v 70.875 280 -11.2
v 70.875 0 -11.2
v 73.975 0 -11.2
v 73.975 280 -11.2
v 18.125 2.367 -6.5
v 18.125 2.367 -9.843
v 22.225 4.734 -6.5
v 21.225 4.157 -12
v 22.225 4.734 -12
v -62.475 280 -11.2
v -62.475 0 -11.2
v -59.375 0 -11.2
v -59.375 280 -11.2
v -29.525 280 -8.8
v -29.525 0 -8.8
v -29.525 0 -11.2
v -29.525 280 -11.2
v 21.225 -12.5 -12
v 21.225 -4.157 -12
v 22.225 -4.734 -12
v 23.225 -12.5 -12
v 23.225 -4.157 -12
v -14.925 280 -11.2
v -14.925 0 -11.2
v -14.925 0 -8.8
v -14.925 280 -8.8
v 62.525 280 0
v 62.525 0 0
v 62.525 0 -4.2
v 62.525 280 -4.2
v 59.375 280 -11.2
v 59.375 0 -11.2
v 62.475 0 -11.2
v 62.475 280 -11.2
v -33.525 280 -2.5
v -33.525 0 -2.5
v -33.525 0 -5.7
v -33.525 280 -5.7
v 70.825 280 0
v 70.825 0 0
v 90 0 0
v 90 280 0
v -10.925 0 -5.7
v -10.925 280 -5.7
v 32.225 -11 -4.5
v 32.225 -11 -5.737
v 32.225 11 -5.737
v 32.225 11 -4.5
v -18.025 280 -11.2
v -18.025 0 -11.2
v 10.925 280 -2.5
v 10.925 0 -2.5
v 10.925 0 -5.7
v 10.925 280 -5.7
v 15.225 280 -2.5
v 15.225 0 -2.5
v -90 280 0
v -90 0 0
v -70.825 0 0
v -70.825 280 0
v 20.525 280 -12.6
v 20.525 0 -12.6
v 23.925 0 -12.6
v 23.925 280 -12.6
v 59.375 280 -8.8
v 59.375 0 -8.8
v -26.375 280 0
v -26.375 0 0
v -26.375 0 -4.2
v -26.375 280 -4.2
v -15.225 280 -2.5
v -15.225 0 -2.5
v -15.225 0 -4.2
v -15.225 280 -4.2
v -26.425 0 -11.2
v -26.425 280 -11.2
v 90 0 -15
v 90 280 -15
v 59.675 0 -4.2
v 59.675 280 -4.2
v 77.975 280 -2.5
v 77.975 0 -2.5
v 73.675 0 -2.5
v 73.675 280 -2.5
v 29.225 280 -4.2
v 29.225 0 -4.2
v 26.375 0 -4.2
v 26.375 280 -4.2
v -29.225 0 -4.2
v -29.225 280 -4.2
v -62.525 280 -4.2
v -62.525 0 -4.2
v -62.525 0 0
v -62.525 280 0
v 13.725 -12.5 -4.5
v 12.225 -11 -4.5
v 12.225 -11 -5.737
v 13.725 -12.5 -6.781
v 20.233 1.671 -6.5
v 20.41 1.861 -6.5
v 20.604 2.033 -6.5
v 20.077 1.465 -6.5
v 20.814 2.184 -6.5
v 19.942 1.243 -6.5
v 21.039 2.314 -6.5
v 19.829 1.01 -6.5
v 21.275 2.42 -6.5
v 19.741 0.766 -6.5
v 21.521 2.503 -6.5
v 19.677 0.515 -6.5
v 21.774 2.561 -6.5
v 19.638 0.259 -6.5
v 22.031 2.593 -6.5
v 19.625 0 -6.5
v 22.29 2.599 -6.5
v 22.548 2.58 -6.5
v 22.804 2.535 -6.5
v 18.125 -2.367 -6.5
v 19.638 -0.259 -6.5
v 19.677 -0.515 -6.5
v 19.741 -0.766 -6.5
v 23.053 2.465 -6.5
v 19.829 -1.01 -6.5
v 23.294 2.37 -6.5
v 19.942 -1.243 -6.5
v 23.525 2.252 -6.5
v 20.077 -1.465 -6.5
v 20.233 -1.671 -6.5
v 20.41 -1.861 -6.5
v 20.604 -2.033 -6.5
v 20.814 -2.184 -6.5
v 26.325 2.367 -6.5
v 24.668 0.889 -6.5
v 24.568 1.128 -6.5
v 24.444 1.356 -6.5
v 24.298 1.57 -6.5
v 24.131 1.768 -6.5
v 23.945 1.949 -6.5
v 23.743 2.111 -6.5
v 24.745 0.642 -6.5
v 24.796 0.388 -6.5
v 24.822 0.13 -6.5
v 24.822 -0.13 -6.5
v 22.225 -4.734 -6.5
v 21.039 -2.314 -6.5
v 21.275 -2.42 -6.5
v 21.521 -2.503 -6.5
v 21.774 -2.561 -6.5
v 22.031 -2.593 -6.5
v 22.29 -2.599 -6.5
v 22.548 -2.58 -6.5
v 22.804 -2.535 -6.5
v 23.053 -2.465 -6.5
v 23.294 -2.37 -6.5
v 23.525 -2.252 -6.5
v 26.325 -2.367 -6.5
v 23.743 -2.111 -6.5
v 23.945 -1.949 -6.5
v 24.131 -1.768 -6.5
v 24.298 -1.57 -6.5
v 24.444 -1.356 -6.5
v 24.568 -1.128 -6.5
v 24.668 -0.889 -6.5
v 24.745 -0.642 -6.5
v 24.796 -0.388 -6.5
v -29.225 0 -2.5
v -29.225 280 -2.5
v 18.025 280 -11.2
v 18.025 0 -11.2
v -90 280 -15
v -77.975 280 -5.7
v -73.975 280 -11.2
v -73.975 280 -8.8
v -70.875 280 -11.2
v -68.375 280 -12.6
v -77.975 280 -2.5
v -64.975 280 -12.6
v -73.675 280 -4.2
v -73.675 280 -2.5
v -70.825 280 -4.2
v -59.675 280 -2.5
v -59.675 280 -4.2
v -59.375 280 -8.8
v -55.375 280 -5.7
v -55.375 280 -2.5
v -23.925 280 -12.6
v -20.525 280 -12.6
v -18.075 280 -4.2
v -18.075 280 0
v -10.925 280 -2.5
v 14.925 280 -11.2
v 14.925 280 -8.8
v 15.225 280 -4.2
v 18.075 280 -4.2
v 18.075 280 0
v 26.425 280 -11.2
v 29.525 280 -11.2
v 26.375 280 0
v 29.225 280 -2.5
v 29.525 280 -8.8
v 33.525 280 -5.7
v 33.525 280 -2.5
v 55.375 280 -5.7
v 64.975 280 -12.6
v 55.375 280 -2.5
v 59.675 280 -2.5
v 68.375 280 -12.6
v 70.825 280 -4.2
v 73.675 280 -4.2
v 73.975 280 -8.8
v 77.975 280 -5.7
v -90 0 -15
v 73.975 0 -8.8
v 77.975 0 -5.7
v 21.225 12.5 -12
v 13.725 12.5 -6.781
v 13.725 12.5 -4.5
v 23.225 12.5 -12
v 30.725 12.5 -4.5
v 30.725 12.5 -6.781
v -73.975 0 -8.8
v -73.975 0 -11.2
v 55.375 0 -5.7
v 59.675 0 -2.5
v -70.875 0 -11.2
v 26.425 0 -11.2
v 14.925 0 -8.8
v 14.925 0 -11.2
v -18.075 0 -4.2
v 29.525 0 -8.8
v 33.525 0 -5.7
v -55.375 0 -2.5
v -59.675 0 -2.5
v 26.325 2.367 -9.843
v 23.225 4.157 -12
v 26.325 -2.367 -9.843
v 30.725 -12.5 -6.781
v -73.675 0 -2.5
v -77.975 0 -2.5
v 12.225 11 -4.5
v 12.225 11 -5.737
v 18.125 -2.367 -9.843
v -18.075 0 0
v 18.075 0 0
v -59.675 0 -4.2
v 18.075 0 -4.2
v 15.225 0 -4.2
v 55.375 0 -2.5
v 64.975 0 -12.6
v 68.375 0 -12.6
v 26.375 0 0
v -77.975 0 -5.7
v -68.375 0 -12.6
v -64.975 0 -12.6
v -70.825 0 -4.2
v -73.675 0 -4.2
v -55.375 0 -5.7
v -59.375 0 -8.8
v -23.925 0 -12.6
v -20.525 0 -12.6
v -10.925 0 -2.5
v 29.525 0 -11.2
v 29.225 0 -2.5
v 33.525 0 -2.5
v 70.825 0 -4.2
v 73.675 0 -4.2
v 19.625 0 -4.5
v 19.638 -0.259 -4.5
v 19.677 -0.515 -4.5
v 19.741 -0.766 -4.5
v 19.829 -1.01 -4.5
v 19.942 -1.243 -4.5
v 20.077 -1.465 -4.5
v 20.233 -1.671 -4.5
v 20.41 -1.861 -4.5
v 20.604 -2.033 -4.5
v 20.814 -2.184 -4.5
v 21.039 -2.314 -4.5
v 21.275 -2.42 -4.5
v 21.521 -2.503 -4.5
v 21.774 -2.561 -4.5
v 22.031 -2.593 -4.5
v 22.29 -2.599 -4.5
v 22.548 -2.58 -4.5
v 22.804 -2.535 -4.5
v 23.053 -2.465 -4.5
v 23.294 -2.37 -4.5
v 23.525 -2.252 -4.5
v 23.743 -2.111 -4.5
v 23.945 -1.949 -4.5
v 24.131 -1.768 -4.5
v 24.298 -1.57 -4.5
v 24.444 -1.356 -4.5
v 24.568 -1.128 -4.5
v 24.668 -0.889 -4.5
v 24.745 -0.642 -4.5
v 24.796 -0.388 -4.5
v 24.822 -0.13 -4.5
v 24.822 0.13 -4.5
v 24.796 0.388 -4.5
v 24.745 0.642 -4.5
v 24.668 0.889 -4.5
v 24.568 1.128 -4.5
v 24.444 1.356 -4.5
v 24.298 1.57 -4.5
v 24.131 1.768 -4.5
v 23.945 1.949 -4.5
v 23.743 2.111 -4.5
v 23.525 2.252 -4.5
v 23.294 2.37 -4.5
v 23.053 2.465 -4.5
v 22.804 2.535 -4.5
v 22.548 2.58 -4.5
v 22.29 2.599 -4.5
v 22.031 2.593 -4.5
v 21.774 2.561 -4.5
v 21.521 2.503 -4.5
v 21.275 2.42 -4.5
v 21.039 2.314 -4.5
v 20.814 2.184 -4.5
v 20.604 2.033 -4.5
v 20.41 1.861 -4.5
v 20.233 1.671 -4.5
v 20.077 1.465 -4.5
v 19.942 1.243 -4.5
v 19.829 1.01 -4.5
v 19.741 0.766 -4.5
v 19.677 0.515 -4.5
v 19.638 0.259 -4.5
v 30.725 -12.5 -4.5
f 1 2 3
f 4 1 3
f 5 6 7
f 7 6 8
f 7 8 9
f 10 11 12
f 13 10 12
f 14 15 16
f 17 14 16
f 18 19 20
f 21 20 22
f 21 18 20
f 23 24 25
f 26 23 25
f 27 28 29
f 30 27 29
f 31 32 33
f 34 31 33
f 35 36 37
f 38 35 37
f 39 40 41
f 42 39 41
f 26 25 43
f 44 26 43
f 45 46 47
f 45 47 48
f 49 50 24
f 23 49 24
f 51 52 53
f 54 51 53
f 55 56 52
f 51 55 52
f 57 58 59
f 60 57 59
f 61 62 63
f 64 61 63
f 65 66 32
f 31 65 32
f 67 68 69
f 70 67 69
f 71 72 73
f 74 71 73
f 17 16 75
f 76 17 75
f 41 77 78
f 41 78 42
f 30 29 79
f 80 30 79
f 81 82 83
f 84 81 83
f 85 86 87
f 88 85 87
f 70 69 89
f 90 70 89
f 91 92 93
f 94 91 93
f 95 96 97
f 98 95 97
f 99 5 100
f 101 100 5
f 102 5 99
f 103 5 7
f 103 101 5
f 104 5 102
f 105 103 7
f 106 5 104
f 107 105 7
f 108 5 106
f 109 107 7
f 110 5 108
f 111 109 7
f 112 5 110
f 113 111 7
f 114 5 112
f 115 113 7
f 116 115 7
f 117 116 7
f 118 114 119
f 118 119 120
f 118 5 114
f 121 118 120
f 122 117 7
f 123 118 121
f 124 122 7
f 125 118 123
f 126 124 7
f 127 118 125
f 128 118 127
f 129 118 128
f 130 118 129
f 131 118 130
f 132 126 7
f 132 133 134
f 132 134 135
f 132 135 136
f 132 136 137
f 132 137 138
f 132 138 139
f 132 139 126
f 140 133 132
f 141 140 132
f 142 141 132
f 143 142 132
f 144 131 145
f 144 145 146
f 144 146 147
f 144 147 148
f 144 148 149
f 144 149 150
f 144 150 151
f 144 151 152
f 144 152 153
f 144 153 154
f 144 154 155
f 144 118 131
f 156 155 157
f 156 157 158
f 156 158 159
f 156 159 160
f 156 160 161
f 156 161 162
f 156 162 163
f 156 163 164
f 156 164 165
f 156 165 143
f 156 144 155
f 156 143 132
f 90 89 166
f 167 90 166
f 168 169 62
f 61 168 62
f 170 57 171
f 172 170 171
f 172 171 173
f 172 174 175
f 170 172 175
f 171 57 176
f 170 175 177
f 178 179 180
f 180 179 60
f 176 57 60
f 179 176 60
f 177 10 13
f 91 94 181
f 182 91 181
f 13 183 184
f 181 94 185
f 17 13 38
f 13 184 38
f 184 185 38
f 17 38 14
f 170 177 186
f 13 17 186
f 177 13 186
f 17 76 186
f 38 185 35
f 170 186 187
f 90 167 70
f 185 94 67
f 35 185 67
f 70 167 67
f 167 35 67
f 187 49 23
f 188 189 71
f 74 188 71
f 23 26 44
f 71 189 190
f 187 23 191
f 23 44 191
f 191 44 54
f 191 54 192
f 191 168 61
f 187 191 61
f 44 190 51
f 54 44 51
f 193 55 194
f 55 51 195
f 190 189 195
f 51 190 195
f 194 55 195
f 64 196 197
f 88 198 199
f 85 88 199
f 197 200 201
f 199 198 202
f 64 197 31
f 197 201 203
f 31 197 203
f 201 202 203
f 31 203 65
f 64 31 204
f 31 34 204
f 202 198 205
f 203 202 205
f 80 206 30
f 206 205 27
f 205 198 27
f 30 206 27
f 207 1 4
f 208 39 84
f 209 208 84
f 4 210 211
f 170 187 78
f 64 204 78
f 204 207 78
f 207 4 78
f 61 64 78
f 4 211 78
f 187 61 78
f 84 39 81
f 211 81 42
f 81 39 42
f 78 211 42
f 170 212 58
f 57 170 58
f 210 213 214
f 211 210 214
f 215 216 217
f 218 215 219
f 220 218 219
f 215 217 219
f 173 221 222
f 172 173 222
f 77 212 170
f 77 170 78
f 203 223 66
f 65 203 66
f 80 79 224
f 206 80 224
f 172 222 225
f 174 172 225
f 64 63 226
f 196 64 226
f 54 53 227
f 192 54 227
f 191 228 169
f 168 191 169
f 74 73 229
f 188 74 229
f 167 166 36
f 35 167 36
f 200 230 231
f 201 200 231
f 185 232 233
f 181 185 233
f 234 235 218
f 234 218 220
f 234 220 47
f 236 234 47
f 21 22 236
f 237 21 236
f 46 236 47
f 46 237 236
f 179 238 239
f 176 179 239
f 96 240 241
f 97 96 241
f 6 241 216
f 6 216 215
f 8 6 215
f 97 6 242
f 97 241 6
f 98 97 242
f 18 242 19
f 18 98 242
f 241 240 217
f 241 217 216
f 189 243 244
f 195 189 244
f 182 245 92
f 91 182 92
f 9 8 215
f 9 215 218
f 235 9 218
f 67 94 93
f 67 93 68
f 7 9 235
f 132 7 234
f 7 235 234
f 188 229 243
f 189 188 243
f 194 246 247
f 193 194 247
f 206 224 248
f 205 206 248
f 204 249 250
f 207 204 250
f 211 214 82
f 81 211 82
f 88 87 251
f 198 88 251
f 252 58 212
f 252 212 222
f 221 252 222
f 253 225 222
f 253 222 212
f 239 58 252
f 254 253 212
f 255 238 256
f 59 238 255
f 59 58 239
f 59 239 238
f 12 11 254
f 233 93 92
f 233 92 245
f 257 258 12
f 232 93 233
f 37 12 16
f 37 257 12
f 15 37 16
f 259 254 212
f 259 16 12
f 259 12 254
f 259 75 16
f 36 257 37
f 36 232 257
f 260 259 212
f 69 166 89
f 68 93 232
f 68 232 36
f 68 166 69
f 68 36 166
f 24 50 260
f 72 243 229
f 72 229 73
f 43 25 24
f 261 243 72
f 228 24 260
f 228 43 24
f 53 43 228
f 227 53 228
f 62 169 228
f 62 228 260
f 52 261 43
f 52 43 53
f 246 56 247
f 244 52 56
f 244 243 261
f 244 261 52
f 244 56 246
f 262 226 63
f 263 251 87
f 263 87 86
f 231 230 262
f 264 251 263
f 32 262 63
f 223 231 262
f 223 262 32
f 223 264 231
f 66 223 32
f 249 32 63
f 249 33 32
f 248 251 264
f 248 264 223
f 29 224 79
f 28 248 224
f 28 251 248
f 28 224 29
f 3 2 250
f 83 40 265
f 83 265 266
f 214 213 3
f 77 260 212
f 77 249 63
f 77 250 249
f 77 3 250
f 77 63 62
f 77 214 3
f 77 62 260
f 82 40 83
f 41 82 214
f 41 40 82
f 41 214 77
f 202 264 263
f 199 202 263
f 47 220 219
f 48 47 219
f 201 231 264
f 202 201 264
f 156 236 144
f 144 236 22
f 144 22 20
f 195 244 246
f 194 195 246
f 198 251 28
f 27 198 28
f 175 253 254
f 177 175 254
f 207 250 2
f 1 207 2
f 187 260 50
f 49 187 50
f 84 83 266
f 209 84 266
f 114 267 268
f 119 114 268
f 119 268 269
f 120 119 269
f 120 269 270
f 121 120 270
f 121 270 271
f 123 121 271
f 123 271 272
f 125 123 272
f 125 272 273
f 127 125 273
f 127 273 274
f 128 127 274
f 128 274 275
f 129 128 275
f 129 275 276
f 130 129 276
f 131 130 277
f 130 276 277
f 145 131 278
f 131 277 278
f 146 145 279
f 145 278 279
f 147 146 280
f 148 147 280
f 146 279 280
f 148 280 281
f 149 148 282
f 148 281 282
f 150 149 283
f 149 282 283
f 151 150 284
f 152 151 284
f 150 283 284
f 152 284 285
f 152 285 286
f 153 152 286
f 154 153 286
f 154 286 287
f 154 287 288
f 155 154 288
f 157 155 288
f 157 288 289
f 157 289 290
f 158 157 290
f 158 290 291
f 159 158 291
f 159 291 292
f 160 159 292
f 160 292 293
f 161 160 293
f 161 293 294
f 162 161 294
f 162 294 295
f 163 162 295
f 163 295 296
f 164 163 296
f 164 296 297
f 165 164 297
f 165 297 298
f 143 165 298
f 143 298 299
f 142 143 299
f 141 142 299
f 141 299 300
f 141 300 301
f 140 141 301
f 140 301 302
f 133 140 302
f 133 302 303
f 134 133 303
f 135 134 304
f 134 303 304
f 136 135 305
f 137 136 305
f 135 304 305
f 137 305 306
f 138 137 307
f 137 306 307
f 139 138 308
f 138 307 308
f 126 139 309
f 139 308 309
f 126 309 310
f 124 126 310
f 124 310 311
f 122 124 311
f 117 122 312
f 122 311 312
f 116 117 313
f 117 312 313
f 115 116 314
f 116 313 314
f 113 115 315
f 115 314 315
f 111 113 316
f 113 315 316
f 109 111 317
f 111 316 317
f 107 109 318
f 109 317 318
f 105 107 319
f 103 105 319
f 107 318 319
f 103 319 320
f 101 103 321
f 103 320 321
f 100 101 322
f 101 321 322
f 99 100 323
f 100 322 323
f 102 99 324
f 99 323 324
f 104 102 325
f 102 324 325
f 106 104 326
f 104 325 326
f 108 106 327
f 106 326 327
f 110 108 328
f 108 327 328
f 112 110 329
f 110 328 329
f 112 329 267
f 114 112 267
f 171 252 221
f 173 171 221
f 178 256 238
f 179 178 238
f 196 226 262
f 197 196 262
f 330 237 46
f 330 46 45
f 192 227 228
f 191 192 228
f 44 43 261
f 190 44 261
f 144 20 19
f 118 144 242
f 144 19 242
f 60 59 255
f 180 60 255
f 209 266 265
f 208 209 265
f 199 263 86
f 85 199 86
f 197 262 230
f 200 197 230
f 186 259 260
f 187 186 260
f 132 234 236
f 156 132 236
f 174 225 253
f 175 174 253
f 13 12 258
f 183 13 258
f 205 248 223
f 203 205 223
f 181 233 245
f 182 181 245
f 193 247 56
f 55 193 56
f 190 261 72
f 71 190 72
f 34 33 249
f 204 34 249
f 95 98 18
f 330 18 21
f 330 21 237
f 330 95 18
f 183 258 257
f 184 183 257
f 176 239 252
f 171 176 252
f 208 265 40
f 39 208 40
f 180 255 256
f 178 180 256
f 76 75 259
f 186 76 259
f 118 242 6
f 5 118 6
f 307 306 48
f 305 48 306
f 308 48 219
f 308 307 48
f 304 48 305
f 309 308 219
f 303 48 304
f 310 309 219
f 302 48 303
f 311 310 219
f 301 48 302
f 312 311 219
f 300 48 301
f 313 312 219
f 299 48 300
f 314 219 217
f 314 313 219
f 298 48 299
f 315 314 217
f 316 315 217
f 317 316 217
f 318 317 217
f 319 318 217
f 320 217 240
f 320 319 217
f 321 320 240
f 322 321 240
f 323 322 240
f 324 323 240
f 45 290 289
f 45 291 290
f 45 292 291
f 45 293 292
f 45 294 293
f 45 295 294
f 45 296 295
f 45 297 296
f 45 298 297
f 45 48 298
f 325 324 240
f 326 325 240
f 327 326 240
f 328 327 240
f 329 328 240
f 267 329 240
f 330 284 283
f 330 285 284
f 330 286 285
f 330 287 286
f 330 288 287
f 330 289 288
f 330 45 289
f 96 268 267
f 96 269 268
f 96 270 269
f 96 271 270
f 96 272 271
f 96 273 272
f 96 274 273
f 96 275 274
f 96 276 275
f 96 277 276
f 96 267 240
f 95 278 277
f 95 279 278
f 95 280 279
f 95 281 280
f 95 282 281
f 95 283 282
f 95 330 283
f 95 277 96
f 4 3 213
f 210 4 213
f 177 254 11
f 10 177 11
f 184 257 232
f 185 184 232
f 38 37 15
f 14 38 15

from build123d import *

# Parameters (mm, degrees)
SKETCH001_W         = 180
SKETCH001_H         = 15
PAD_DEPTH           = 280
POCKET_DEPTH        = 280.001
LINEARPATTERN_COUNT = 4
LINEARPATTERN_PITCH = 44.45
PAD001_DEPTH        = 12.5
POCKET001_DEPTH     = 5.5
SKETCH004_R         = 2.6
POCKET002_DEPTH     = 5
CHAMFER_SIZE        = 1.5


with BuildPart() as body:
    # Sketch001 → Pad (new body)
    with BuildSketch(Plane.XZ):
        with Locations((0, -7.5)):
            Rectangle(SKETCH001_W, SKETCH001_H)
    extrude(amount=-PAD_DEPTH)

    # Sketch → Pocket (cut, through all)
    with BuildSketch(Plane.XZ):
        Polygon((-70.825, 0), (-70.825, -4.2), (-73.675, -4.2), (-73.675, -2.5), (-77.975, -2.5), (-77.975, -5.7), (-73.975, -8.8), (-73.975, -11.2), (-70.875, -11.2), (-68.375, -12.6), (-64.975, -12.6), (-62.475, -11.2), (-59.375, -11.2), (-59.375, -8.8), (-55.375, -5.7), (-55.375, -2.5), (-59.675, -2.5), (-59.675, -4.2), (-62.525, -4.2), (-62.525, 0), align=None)
    pocket = extrude(amount=-POCKET_DEPTH, mode=Mode.SUBTRACT)

    # LinearPattern: Pocket ×4
    with Locations(*[(i * LINEARPATTERN_PITCH, 0, 0) for i in range(1, LINEARPATTERN_COUNT)]):
        add(pocket, mode=Mode.SUBTRACT)


with BuildPart() as body001:
    # Sketch002 → Pad001 (new body, symmetric)
    with BuildSketch(Plane.XZ):
        Polygon((-10, -5.736949), (-1, -12), (1, -12), (10, -5.736949), (10, -4.5), (-10, -4.5), align=None)
    extrude(amount=PAD001_DEPTH, both=True)

    # Sketch003 (on Face2 of Pad001) → Pocket001 (cut)
    with BuildSketch(Plane(origin=(0, 0, -12), x_dir=(1, 0, 0), z_dir=(0, 0, -1))):
        Polygon((0, 4.734272), (-4.1, 2.367136), (-4.1, -2.367136), (0, -4.734272), (4.1, -2.367136), (4.1, 2.367136), align=None)
    extrude(amount=-POCKET001_DEPTH, mode=Mode.SUBTRACT)

    # Sketch004 (on Face12 of Pocket001) → Pocket002 (cut)
    with BuildSketch(Plane(origin=(0, 0, -4.5), x_dir=(-1, 0, 0), z_dir=(0, 0, 1))):
        Circle(SKETCH004_R)
    extrude(amount=-POCKET002_DEPTH, mode=Mode.SUBTRACT)

    # Chamfer
    chamfer_edges = [body001.edges().sort_by_distance(p)[0] for p in [
        (-10, -12.5, -5.118474),
        (10, -12.5, -5.118474),
        (-10, 12.5, -5.118474),
        (10, 12.5, -5.118474),
    ]]
    chamfer(chamfer_edges, length=CHAMFER_SIZE)


with BuildPart() as body001_1:
    # Body001 placement: moved
    add(body001.part.moved(Location((22.225, 0, 0))))


solid = Compound([body.part, body001_1.part])
